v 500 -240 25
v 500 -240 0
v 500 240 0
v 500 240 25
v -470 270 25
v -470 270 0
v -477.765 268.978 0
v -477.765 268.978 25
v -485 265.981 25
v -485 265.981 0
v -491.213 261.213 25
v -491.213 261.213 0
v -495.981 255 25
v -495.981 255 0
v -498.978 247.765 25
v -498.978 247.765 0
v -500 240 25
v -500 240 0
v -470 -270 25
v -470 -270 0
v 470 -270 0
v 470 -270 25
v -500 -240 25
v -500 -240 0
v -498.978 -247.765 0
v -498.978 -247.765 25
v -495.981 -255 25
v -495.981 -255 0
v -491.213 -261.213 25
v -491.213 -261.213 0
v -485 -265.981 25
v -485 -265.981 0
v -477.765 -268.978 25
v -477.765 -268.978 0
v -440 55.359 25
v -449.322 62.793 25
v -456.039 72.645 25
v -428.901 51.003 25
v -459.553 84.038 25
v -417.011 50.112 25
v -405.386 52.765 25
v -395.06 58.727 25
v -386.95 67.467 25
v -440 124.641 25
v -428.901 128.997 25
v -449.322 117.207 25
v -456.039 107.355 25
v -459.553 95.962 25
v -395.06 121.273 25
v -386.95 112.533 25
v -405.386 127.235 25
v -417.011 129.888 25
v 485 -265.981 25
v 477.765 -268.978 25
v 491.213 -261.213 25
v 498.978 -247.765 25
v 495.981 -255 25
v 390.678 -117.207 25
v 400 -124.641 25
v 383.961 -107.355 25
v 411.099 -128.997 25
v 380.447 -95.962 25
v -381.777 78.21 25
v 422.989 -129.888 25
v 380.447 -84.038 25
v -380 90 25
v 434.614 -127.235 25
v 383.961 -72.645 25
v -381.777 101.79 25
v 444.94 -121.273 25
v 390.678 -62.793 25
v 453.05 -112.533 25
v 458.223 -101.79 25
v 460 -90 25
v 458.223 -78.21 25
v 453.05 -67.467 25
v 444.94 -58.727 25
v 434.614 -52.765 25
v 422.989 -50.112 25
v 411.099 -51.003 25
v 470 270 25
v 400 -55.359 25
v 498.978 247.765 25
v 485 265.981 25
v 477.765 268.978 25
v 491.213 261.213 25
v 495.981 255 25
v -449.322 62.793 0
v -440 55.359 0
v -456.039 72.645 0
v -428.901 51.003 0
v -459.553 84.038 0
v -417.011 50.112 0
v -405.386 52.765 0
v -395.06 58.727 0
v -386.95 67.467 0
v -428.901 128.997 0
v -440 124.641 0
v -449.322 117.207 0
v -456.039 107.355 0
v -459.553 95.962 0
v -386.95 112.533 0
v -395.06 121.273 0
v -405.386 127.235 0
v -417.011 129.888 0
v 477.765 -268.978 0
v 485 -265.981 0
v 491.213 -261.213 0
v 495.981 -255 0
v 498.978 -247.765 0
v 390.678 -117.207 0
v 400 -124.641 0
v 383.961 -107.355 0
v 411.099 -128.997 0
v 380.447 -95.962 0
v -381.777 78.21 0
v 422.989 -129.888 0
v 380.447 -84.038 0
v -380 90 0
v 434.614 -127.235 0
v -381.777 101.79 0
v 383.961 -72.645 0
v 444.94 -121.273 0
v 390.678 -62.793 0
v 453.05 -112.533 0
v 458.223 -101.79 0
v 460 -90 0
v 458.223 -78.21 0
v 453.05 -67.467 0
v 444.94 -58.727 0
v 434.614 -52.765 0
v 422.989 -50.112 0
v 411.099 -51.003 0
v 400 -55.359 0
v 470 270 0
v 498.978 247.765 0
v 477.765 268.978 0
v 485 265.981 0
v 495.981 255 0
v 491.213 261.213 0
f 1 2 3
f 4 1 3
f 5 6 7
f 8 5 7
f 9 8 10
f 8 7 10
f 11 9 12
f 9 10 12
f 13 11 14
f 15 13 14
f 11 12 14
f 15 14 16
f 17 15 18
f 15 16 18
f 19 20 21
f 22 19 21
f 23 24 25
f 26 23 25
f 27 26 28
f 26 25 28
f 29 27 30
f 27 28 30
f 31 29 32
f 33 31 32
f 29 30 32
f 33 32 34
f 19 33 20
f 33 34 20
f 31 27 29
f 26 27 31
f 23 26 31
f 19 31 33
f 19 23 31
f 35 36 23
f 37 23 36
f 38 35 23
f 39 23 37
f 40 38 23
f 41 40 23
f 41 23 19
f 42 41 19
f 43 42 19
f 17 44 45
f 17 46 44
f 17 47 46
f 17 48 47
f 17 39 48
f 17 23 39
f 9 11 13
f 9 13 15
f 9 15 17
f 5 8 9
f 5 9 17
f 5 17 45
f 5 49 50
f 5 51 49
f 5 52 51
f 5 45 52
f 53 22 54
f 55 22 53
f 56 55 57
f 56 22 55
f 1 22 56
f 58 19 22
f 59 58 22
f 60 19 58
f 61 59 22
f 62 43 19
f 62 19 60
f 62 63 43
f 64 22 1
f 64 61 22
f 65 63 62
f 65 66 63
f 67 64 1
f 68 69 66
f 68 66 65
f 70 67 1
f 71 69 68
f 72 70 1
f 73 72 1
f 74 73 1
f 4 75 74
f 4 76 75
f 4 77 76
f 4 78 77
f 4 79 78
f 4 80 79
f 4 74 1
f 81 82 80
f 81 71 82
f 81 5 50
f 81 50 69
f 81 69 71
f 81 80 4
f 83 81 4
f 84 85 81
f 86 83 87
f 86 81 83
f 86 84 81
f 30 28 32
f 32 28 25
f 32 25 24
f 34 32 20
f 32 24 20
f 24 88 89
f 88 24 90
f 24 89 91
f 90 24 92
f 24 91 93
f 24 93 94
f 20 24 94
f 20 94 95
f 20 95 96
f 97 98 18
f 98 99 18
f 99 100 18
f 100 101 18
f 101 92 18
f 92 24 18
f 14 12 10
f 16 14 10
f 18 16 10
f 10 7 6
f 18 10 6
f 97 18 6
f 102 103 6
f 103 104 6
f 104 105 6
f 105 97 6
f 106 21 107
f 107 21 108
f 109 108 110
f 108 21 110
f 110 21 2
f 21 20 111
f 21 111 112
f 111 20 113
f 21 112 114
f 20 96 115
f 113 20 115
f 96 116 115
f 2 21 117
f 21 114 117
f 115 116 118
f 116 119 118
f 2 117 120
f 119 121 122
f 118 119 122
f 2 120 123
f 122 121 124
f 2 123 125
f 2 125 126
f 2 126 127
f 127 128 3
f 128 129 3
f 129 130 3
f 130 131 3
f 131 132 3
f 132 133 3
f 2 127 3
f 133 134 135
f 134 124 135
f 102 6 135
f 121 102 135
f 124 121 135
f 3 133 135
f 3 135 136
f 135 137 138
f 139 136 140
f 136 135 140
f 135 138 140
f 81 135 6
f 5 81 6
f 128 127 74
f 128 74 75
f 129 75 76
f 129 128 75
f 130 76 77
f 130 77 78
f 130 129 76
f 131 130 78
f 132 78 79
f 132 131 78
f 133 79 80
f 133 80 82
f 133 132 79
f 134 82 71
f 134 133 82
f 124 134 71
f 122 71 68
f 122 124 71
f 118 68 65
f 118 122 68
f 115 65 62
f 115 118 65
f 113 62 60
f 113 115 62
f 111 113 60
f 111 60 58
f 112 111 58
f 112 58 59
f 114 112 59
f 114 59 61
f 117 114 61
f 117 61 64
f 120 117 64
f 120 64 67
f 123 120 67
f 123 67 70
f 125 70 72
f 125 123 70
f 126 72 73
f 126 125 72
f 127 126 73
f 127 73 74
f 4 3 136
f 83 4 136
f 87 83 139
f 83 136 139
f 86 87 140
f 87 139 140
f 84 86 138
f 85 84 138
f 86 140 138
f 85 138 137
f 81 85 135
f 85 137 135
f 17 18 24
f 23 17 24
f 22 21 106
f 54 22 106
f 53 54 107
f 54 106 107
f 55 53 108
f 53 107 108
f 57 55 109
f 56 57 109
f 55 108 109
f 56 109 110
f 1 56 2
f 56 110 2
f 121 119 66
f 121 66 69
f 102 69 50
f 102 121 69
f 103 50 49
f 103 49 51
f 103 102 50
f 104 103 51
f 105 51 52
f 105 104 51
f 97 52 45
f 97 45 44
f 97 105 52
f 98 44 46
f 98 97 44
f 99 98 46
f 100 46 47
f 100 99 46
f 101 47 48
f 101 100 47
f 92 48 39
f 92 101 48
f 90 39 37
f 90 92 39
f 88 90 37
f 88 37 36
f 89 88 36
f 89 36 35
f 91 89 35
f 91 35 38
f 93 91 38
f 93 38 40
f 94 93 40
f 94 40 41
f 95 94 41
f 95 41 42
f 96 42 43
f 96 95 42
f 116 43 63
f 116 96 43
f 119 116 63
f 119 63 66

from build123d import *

# Parameters (mm, degrees)
F0_W     = 1000
F0_H     = 340
F0_R     = 40
F1_DEPTH = 25


with BuildPart() as f1:
    # F0 (on Top) → F1 (new body)
    with BuildSketch(Plane.XY):
        with BuildLine():
            ThreePointArc((500, 240), (491.213203, 261.213203), (470, 270))
            Line((470, 270), (-470, 270))
            ThreePointArc((-470, 270), (-491.213203, 261.213203), (-500, 240))
            Line((-500, 240), (-500, 170))
            Line((-500, 170), (500, 170))
            Line((500, 170), (500, 240))
        make_face()
        with BuildLine():
            Line((500, -240), (500, -170))
            Line((500, -170), (-500, -170))
            Line((-500, -170), (-500, -240))
            ThreePointArc((-500, -240), (-491.213203, -261.213203), (-470, -270))
            Line((-470, -270), (470, -270))
            ThreePointArc((470, -270), (491.213203, -261.213203), (500, -240))
        make_face()
        Rectangle(F0_W, F0_H)
        with Locations((420, -90)):
            Circle(F0_R, mode=Mode.SUBTRACT)
        with Locations((-420, 90)):
            Circle(F0_R, mode=Mode.SUBTRACT)
    extrude(amount=F1_DEPTH)


solid = f1.part
